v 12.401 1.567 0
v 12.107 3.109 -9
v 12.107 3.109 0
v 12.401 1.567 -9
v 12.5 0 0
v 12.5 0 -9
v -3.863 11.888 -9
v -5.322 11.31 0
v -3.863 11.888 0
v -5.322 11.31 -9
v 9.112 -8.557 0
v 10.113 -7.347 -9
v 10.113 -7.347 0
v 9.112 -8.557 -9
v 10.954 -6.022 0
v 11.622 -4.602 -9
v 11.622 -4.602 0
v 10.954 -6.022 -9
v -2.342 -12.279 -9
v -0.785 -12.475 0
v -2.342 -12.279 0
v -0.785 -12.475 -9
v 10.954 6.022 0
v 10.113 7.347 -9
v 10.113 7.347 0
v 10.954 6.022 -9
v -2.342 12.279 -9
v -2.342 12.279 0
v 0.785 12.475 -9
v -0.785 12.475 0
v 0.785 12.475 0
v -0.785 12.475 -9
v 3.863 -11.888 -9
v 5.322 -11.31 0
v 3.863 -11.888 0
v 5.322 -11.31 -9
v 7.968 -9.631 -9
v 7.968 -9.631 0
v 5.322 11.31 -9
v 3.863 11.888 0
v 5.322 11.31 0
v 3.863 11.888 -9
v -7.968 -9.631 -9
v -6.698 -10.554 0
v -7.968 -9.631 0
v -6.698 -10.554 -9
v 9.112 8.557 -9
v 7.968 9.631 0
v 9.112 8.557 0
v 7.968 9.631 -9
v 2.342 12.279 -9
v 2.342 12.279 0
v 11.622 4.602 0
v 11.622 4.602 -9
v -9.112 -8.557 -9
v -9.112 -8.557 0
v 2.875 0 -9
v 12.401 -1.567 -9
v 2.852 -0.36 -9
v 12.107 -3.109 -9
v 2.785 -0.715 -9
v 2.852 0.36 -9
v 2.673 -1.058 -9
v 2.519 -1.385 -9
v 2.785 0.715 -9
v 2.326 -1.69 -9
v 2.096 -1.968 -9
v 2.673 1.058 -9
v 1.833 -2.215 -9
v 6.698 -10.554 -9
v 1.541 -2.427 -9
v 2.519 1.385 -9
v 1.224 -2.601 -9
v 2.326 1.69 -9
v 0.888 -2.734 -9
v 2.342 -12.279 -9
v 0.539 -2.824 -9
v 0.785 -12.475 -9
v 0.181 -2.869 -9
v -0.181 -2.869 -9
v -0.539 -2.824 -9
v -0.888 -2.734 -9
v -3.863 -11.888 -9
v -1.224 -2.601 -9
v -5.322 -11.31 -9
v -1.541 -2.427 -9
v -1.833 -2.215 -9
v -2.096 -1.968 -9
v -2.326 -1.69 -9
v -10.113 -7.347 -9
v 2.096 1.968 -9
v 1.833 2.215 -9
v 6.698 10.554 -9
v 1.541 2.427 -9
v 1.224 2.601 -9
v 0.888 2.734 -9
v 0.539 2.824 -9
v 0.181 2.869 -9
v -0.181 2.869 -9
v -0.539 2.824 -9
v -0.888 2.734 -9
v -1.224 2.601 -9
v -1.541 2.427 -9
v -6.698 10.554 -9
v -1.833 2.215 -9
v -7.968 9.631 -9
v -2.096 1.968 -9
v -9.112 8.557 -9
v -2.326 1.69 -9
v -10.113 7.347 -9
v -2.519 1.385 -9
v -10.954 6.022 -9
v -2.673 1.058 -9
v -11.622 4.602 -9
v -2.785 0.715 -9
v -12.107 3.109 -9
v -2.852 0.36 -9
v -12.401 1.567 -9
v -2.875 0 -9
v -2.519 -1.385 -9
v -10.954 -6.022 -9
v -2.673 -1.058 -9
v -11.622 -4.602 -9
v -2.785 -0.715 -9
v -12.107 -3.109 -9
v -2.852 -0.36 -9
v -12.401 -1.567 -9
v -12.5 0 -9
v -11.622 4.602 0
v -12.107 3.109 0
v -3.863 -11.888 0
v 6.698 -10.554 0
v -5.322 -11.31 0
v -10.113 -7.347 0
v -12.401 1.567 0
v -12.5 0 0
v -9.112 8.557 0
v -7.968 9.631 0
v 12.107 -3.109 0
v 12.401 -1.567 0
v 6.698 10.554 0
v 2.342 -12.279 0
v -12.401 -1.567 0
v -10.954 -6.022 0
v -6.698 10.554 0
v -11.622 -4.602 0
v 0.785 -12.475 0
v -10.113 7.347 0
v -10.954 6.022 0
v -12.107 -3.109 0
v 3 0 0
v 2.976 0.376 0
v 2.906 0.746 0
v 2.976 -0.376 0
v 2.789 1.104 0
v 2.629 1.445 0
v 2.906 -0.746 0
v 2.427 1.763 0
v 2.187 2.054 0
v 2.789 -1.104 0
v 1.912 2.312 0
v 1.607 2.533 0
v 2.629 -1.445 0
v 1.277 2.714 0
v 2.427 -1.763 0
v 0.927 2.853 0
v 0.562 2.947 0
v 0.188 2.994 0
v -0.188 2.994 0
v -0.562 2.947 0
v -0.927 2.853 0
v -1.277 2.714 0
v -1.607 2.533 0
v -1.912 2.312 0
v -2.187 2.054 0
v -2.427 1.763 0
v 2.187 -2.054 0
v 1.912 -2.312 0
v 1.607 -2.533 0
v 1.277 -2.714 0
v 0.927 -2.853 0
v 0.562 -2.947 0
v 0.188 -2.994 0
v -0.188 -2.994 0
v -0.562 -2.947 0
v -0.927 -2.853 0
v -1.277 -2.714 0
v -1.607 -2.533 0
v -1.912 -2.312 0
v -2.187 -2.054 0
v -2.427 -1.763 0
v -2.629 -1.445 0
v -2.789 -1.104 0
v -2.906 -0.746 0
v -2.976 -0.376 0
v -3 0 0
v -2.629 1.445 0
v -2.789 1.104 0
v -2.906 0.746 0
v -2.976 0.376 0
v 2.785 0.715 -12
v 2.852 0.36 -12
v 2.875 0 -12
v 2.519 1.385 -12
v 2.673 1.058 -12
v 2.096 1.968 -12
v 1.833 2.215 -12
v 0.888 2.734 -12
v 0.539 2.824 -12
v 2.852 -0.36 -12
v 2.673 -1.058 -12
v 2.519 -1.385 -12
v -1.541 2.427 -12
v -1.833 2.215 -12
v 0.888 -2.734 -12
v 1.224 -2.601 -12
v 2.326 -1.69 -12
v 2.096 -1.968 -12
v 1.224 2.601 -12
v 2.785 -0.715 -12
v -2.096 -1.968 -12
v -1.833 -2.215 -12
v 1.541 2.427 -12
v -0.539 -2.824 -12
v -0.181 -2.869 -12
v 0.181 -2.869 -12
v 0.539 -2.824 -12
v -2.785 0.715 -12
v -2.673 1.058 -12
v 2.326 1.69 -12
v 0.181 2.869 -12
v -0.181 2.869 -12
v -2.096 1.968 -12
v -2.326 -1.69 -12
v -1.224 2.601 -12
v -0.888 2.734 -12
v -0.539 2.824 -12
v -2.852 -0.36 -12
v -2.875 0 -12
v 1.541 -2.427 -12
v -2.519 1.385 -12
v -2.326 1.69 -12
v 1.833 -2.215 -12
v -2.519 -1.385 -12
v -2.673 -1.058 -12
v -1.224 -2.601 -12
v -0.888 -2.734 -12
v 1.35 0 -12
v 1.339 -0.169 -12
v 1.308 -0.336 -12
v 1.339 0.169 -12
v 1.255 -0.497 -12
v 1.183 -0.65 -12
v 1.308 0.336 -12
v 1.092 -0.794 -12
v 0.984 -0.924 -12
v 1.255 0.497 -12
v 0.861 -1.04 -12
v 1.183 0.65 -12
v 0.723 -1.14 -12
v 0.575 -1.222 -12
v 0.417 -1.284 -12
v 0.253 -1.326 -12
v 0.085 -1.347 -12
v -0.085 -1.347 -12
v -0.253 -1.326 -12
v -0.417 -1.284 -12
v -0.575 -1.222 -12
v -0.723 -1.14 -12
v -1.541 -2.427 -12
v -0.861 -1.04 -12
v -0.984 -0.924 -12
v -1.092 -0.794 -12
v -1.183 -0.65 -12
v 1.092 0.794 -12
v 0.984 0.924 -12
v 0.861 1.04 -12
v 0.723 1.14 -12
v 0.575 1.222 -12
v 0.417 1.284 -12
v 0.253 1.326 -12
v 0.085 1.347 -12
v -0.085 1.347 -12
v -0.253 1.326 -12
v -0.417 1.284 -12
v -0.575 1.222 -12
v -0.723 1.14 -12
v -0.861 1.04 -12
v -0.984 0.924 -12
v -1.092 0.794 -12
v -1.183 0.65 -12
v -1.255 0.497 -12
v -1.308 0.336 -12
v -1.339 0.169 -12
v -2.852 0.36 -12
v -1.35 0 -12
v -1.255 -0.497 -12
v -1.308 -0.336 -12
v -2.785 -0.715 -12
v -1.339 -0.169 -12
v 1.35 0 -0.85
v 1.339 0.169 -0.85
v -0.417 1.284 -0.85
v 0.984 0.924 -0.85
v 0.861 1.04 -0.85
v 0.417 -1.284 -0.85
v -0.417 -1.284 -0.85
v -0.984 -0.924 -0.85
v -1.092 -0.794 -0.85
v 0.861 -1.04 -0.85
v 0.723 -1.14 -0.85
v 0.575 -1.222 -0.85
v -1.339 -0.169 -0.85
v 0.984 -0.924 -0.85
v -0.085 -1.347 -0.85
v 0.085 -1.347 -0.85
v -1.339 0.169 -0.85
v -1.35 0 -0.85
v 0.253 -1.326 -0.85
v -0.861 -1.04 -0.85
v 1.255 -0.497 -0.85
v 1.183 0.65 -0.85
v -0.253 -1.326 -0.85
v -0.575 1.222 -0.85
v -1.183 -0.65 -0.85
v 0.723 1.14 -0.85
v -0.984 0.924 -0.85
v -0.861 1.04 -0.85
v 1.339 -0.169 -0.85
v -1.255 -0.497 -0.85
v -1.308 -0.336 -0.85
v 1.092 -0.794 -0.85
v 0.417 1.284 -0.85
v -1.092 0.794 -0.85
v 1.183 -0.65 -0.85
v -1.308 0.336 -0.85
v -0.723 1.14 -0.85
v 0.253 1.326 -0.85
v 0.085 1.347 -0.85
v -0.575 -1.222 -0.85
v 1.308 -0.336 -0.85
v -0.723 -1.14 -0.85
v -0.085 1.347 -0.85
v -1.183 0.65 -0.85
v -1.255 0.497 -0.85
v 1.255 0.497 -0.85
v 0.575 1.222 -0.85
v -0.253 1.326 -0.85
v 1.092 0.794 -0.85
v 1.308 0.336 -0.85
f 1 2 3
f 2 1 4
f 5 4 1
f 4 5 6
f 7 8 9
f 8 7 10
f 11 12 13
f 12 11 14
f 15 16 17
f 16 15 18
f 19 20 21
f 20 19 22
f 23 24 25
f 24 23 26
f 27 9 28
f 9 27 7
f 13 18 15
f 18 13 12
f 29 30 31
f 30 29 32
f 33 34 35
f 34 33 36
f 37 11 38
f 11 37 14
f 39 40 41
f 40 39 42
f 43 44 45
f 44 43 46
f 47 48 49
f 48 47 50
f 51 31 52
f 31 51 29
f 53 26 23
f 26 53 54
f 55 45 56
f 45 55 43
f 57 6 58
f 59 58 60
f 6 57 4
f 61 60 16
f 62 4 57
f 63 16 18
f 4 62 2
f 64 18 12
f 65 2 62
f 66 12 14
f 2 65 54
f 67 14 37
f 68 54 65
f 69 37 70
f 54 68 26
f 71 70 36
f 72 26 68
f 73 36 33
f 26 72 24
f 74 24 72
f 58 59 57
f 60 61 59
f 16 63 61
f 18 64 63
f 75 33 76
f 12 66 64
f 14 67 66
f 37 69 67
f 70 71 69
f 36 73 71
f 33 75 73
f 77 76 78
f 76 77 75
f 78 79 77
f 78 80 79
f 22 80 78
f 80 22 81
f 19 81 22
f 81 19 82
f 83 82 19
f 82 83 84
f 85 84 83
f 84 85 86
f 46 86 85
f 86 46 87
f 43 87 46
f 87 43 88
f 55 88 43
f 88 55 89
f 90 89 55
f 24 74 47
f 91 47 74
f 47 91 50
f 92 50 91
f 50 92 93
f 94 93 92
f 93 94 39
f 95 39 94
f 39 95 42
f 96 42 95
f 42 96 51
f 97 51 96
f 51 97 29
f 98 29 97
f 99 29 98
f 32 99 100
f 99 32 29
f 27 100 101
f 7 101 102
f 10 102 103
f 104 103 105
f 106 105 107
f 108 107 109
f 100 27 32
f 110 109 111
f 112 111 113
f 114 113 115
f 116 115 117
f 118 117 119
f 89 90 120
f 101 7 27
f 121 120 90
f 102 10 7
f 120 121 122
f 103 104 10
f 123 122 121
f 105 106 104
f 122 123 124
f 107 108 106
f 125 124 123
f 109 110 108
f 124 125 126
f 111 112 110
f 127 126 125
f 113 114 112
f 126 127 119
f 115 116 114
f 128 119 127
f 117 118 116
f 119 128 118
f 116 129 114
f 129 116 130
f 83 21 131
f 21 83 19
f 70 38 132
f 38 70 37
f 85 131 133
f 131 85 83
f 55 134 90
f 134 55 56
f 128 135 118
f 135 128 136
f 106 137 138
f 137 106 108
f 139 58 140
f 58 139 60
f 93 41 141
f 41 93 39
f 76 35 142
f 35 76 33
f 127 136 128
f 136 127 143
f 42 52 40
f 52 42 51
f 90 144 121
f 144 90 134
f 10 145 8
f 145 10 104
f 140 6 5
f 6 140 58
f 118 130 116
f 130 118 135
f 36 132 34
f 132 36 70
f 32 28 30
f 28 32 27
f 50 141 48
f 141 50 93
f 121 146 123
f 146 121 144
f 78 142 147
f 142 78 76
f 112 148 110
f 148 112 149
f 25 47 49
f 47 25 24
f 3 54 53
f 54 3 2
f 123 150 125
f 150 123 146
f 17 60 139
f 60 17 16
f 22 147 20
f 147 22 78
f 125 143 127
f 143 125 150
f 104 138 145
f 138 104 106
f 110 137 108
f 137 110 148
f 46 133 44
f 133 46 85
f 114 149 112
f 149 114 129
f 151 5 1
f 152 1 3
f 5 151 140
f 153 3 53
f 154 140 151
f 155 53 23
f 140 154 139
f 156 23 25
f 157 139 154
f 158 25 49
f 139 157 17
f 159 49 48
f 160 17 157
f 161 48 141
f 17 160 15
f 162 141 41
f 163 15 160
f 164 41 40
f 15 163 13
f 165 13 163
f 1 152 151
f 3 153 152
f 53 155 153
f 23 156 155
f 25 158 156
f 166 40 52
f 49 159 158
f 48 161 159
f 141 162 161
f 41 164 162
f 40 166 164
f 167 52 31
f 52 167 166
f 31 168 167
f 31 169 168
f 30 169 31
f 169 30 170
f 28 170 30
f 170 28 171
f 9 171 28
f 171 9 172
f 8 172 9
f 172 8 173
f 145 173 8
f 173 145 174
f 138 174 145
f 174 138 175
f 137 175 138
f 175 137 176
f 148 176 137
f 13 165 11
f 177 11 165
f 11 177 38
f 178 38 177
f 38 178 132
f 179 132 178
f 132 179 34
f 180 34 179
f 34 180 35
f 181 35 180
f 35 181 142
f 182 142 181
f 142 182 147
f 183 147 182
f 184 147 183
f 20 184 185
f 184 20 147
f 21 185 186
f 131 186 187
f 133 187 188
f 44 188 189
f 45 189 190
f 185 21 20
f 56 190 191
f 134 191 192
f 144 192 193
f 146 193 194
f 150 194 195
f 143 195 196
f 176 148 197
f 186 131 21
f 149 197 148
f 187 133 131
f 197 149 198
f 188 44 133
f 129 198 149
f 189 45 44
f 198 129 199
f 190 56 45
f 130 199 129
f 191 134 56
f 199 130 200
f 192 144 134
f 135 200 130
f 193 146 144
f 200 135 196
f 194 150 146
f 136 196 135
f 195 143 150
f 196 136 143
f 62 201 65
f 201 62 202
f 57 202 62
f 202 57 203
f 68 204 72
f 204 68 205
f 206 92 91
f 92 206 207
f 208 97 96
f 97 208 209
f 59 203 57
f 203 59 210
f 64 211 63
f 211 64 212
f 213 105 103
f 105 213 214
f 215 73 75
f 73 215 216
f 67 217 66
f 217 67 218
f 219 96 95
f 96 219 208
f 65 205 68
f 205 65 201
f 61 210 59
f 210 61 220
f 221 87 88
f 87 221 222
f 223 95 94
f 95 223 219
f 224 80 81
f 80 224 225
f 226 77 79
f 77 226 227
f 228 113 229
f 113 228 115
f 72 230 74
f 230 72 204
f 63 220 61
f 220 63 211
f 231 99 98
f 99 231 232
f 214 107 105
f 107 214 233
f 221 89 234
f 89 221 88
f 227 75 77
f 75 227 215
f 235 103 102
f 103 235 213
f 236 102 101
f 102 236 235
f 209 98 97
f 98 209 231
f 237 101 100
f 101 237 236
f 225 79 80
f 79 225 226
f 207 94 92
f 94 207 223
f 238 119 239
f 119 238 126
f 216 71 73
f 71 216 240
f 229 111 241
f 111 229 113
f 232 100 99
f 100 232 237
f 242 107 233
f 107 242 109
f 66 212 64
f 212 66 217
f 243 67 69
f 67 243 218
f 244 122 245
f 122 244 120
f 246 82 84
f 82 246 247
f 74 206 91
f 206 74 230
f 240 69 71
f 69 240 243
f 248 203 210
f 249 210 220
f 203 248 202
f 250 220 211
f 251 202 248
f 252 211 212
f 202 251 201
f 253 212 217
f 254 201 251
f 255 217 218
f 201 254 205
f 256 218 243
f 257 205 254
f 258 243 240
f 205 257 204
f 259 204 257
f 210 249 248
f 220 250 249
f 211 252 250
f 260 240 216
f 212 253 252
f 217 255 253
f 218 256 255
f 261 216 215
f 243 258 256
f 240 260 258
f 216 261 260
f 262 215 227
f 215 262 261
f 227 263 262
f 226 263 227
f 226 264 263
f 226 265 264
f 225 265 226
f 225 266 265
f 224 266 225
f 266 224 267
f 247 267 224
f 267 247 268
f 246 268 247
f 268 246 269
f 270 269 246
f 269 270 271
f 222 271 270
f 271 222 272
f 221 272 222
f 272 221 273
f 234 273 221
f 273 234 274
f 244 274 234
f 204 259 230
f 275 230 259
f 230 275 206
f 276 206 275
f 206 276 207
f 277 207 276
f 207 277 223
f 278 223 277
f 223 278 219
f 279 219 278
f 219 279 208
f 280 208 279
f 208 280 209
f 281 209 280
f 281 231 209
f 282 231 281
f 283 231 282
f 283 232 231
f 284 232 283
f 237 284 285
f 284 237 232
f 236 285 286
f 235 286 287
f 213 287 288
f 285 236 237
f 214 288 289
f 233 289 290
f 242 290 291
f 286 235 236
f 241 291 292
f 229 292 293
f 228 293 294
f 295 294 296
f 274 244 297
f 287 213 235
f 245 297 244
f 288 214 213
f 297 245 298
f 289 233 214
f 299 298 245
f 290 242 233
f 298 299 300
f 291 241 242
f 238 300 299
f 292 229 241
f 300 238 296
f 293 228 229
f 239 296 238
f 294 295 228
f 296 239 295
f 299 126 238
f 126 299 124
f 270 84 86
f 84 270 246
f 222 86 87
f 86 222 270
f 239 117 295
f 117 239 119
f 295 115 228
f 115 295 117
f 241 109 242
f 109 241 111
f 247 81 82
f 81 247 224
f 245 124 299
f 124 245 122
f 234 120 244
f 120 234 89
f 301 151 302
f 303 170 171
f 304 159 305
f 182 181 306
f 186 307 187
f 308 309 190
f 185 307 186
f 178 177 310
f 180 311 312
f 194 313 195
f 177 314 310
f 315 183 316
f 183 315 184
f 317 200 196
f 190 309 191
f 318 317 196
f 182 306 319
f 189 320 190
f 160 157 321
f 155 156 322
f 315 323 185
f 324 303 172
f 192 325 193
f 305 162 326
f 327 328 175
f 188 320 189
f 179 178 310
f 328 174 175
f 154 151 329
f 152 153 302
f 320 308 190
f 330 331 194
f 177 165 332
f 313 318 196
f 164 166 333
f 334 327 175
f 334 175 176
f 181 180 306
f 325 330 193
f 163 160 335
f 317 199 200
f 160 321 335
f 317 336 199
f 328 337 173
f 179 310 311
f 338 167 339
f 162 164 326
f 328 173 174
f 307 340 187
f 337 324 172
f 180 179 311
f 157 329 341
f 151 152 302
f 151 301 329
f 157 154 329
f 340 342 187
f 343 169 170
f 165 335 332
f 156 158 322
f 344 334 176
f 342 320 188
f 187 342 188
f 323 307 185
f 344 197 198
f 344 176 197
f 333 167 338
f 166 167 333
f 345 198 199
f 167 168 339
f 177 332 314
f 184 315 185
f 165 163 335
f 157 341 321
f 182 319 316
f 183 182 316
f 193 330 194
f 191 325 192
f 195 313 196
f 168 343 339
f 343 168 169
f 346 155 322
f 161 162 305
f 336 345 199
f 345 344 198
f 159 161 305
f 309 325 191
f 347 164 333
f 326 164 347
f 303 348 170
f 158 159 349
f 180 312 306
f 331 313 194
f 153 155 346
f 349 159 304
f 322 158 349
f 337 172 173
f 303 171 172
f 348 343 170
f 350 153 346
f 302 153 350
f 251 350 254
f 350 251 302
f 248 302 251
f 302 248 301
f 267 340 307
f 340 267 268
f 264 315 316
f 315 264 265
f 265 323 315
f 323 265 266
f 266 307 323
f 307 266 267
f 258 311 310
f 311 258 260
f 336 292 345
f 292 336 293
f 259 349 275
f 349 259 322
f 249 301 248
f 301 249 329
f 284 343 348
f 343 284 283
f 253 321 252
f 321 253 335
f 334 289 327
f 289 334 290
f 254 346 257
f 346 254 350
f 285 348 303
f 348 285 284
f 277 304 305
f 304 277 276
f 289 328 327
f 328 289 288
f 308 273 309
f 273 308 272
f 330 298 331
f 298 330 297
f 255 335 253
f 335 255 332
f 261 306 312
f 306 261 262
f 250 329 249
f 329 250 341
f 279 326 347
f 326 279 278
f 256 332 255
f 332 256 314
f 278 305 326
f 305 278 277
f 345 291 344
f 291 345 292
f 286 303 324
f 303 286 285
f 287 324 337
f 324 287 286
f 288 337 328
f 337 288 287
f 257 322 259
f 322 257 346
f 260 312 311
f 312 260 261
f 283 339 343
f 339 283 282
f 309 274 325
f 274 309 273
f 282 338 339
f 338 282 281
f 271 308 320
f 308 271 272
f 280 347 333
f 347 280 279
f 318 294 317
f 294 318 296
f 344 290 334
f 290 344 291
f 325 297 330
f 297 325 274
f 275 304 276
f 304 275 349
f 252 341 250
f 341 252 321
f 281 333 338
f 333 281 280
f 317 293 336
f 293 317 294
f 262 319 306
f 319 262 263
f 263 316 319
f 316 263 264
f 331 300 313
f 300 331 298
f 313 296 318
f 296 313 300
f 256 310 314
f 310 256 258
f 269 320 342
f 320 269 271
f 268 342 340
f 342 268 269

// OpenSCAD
$fn = 50;

difference() {
	union() {
		translate(v = [0, 0, -9.0]) {
			cylinder(h = 9, r = 12.5);
		}
		#translate(v = [0, 0, -12.0]) {
			cylinder(h = 12, r = 2.875);
		}
	}
	union() {
		translate(v = [0, 0, 0]) {
			rotate(a = [0, 0, 0]) {
				difference() {
					union() {
						translate(v = [0, 0, -12.0]) {
							cylinder(h = 12, r = 1.0);
						}
						translate(v = [0, 0, -0.85]) {
							cylinder(h = 0.85, r1 = 1.35, r2 = 3.0);
						}
						translate(v = [0, 0, -12.0]) {
							cylinder(h = 12, r = 1.35);
						}
						translate(v = [0, 0, -12.0]) {
							cylinder(h = 12, r = 1.0);
						}
					}
					union();
				}
			}
		}
	}
}
